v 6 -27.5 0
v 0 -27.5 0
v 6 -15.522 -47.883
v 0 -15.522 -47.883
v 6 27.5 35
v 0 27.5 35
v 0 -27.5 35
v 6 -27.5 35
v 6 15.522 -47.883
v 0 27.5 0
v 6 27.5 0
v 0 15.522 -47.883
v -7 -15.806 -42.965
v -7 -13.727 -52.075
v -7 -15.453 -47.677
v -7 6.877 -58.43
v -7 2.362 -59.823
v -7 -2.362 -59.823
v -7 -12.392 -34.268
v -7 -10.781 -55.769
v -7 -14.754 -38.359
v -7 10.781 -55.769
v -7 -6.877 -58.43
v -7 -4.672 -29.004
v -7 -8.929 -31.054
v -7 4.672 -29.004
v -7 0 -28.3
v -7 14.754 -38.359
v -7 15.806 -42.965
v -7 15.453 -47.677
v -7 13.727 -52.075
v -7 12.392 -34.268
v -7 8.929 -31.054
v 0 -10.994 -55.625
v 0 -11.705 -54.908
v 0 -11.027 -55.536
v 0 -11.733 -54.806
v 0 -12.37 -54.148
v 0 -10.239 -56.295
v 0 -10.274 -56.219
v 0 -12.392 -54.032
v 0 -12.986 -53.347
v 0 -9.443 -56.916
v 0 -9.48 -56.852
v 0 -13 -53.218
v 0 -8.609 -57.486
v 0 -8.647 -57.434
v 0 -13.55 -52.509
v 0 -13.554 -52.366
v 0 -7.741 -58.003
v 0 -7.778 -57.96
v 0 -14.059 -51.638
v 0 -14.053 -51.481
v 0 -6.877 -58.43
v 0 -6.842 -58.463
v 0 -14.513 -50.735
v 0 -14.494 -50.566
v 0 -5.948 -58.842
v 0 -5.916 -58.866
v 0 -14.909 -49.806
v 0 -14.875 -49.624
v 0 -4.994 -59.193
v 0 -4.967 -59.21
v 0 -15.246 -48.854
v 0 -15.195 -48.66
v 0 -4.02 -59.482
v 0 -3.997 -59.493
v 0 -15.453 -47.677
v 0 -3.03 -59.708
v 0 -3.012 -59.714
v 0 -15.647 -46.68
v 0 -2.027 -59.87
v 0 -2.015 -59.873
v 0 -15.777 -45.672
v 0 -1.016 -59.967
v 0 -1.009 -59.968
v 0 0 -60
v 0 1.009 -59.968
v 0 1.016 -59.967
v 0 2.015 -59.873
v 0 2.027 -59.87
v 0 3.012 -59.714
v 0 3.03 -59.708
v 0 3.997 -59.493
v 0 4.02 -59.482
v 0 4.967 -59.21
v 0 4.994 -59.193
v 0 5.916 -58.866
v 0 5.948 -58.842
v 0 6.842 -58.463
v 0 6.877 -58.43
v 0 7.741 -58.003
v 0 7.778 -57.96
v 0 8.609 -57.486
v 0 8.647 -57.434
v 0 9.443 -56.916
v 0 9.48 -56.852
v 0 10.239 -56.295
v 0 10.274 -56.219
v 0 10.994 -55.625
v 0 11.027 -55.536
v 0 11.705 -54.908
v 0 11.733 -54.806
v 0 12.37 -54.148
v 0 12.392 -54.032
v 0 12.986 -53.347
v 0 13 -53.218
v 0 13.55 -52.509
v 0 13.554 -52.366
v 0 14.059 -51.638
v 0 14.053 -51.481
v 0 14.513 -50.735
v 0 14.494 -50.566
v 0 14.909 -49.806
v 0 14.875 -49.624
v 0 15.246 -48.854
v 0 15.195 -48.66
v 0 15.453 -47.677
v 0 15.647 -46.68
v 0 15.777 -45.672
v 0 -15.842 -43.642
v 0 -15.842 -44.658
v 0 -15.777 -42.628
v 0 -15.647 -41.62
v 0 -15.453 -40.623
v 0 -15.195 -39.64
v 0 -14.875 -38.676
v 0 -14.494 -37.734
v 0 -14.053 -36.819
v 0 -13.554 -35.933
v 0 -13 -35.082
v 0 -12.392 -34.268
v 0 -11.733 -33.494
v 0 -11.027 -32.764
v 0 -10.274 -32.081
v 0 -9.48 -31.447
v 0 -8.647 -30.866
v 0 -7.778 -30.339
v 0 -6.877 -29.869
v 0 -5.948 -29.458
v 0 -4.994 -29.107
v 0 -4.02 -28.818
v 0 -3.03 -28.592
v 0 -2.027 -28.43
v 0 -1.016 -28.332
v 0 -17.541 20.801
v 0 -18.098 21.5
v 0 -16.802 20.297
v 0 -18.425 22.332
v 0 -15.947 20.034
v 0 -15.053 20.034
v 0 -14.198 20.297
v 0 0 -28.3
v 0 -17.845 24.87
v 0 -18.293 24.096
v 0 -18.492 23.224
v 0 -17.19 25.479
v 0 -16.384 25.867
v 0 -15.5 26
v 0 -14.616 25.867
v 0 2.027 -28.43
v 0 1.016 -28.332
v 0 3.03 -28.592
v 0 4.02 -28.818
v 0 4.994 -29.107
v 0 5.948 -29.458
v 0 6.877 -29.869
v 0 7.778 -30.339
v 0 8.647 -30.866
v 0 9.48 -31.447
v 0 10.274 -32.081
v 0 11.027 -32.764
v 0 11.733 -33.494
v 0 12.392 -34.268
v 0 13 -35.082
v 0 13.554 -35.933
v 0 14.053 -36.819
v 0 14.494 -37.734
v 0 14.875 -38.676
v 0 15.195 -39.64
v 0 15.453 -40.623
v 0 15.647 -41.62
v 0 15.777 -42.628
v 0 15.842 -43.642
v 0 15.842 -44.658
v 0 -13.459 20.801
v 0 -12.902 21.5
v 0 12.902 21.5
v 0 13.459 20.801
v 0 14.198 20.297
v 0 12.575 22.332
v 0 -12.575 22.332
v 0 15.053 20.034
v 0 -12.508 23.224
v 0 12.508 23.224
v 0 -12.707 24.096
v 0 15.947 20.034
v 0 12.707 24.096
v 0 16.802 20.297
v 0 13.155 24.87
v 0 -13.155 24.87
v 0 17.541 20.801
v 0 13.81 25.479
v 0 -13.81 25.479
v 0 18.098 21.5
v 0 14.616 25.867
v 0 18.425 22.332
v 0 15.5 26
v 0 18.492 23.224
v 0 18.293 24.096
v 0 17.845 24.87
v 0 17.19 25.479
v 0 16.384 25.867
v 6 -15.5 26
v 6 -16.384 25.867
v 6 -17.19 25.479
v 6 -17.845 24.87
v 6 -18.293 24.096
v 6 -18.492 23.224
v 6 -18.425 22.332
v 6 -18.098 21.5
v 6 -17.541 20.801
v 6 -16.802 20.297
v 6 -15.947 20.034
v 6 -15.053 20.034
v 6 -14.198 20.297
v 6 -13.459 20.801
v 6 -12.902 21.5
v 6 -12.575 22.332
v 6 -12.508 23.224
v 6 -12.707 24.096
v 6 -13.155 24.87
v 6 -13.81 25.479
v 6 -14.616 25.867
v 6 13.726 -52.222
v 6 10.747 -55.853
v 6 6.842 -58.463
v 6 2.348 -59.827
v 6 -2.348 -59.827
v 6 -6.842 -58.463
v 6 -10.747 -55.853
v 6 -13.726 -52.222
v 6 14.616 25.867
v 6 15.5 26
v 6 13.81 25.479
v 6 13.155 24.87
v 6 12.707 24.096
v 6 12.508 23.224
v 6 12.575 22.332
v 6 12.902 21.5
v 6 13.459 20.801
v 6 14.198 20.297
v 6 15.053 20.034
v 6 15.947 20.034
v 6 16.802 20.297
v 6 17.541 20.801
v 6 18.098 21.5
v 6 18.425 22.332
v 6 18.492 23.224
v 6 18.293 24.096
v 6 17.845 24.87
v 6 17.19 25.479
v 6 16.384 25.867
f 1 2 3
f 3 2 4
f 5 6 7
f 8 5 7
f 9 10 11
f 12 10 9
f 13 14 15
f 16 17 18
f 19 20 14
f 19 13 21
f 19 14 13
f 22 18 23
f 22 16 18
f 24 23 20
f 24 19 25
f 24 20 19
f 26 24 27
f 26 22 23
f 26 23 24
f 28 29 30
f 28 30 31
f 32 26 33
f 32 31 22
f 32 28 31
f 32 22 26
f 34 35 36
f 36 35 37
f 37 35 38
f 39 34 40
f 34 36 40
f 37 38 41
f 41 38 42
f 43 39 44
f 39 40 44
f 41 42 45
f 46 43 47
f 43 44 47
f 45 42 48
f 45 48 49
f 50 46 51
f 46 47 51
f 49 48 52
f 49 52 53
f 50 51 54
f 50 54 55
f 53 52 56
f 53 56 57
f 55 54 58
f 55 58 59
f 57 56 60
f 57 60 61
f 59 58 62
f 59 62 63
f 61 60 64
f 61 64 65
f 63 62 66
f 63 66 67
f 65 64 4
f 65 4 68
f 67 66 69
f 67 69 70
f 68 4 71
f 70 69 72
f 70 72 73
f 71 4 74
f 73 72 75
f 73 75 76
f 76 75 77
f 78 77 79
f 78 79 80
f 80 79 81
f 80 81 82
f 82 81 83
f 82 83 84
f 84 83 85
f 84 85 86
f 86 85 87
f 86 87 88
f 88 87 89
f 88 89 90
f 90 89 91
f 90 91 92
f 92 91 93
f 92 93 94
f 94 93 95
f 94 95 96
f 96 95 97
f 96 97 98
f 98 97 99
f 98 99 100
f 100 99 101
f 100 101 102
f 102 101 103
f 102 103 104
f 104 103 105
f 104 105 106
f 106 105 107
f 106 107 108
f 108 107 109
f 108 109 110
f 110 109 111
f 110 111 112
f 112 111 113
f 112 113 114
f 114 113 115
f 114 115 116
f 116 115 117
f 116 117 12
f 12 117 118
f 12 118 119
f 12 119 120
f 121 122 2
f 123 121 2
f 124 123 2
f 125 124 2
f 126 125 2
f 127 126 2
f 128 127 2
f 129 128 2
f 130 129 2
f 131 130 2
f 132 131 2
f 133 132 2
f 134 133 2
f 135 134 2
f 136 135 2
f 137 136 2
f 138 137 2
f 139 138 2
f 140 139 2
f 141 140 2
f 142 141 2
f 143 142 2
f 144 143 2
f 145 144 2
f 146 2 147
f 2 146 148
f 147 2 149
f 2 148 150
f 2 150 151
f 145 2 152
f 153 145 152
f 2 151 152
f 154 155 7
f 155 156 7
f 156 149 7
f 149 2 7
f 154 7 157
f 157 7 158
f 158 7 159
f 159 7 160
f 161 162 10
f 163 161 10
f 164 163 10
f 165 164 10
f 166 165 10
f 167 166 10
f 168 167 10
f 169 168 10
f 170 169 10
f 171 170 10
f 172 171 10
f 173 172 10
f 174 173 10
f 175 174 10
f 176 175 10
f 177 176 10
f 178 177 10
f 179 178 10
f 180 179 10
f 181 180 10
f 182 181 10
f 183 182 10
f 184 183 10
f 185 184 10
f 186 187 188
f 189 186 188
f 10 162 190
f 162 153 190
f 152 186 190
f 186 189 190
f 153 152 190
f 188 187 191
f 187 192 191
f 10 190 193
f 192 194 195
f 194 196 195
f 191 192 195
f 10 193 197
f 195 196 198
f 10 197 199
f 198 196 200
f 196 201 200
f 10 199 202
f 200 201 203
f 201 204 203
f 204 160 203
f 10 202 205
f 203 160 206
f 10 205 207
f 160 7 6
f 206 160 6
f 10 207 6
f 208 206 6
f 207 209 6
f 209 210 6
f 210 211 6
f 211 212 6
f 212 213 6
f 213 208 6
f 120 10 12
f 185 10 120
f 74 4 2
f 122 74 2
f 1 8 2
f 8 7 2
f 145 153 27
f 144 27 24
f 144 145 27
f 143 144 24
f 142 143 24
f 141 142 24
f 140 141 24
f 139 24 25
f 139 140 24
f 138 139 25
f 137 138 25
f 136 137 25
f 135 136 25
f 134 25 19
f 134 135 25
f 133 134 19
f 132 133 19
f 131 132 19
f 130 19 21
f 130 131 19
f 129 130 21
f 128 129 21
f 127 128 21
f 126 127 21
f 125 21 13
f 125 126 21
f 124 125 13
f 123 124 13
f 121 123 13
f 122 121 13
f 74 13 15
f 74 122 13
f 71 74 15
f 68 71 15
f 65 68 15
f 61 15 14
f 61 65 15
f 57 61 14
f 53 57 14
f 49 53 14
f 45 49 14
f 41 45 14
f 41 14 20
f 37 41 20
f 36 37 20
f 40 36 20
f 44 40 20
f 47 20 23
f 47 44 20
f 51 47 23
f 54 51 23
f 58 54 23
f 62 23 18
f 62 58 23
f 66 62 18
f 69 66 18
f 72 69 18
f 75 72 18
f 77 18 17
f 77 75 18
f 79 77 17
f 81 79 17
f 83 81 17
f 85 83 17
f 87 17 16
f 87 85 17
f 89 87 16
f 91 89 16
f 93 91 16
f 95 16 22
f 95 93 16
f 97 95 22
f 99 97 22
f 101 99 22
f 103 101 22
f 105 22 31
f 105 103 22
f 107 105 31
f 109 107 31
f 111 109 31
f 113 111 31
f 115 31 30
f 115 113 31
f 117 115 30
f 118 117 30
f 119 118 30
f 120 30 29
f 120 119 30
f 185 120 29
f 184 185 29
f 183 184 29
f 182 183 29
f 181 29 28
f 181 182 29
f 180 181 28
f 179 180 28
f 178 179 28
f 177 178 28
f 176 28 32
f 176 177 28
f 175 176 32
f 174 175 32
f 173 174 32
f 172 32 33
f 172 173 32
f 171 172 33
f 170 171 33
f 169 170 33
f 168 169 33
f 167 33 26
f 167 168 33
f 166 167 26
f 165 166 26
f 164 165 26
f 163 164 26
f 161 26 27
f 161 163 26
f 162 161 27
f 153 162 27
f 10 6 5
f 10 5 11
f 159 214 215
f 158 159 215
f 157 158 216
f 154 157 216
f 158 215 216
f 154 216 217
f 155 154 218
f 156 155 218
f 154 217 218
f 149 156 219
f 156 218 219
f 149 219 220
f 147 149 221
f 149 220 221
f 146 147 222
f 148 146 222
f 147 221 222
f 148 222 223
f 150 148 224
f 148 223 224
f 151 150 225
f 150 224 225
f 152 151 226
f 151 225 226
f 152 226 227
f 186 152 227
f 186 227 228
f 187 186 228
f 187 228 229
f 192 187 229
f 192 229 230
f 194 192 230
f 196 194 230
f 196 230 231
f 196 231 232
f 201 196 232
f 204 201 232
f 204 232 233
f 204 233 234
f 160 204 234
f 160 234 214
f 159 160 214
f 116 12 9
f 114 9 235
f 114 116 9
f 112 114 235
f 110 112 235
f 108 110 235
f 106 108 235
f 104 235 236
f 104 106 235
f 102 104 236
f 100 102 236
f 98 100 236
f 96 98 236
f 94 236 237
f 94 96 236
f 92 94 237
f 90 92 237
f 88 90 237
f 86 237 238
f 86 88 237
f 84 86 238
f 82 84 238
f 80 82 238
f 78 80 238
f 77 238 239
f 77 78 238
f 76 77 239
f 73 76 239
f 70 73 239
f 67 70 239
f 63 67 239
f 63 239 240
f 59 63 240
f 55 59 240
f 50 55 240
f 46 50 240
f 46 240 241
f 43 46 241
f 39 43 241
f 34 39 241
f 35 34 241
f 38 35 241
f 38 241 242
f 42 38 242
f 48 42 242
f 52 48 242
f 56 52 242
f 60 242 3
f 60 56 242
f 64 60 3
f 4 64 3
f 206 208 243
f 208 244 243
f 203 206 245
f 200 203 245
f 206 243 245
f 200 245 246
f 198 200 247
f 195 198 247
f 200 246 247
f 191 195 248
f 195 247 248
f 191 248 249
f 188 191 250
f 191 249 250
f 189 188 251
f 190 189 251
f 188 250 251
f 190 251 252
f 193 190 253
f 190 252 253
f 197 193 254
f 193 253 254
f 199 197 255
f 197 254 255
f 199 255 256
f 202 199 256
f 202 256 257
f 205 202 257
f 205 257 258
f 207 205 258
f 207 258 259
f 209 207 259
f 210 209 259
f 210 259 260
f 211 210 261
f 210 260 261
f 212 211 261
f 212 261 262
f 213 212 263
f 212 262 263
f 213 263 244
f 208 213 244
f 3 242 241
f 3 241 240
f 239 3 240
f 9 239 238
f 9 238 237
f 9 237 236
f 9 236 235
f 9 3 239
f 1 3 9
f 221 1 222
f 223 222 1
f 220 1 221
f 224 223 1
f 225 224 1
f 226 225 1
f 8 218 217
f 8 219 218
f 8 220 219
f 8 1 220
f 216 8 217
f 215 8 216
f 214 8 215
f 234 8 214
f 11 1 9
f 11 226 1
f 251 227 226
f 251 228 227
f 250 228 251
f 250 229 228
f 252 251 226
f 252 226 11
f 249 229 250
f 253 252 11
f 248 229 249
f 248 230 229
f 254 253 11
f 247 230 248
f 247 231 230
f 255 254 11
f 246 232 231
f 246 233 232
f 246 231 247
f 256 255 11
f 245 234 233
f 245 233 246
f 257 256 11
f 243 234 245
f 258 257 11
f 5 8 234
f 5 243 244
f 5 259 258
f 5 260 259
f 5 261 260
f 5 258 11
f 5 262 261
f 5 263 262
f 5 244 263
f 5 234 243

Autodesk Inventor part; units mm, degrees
ref_plane "YZ Plane" through (0, 0, 0) normal (1, 0, 0) x (0, 1, 0)
ref_plane "XZ Plane" through (0, 0, 0) normal (0, 1, 0) x (-1, 0, 0)
ref_plane "XY Plane" through (0, 0, 0) normal (0, 0, 1) x (1, 0, 0)
sketch "Sketch1" plane through (0, 0, 0) normal (1, 0, 0) x (0, 1, 0)
  line L0 (27.5, 35) -> (-27.5, 35)
  line L1 (-27.5, 35) -> (-27.5, 0)
  line L2 (-27.5, 0) -> (-15.5217, -47.8829)
  arc A0 (-15.5217, -47.8829) -> (15.5217, -47.8829) centre (0, -44) ccw
  line L3 (27.5, 35) -> (27.5, 0)
  line L4 (27.5, 0) -> (15.5217, -47.8829)
  line L5 (-38.5, 0) -> (38.5, 0) construction
  line L6 (0, -79) -> (0, 54) construction
  circle A1 centre (0, -44) radius 9
  point P0 (0, 0)
  point P1 (0, -60)
  dimension "d0" = 55
  dimension "d1" = 35
  dimension "d2" = 18
  dimension "d3" = 16
  dimension "d4" = 60
extrude "Extrusion1" add sketch "Sketch1" along normal blind 6 contours L3 L4 A0 L2 L1 L0 | A1
sketch "Sketch2" plane through (0, 0, 0) normal (-1, 0, 0) x (0, 0, 1)
  circle A0 centre (-44.1499, 0) radius 15.8501
  arc A1 (-47.8829, 15.5217) -> (-47.8829, -15.5217) centre (-44, 0) ccw construction
  point P0 (0, 0)
extrude "Extrusion2" add sketch "Sketch2" along normal blind 7
hole "Hole1" at (0, 15.5, 23) direction (1, 0, 0) diameter 6 end through all
hole "Hole2" at (0, -15.5, 23) direction (1, 0, 0) diameter 6 end through all
properties part number "collar"
